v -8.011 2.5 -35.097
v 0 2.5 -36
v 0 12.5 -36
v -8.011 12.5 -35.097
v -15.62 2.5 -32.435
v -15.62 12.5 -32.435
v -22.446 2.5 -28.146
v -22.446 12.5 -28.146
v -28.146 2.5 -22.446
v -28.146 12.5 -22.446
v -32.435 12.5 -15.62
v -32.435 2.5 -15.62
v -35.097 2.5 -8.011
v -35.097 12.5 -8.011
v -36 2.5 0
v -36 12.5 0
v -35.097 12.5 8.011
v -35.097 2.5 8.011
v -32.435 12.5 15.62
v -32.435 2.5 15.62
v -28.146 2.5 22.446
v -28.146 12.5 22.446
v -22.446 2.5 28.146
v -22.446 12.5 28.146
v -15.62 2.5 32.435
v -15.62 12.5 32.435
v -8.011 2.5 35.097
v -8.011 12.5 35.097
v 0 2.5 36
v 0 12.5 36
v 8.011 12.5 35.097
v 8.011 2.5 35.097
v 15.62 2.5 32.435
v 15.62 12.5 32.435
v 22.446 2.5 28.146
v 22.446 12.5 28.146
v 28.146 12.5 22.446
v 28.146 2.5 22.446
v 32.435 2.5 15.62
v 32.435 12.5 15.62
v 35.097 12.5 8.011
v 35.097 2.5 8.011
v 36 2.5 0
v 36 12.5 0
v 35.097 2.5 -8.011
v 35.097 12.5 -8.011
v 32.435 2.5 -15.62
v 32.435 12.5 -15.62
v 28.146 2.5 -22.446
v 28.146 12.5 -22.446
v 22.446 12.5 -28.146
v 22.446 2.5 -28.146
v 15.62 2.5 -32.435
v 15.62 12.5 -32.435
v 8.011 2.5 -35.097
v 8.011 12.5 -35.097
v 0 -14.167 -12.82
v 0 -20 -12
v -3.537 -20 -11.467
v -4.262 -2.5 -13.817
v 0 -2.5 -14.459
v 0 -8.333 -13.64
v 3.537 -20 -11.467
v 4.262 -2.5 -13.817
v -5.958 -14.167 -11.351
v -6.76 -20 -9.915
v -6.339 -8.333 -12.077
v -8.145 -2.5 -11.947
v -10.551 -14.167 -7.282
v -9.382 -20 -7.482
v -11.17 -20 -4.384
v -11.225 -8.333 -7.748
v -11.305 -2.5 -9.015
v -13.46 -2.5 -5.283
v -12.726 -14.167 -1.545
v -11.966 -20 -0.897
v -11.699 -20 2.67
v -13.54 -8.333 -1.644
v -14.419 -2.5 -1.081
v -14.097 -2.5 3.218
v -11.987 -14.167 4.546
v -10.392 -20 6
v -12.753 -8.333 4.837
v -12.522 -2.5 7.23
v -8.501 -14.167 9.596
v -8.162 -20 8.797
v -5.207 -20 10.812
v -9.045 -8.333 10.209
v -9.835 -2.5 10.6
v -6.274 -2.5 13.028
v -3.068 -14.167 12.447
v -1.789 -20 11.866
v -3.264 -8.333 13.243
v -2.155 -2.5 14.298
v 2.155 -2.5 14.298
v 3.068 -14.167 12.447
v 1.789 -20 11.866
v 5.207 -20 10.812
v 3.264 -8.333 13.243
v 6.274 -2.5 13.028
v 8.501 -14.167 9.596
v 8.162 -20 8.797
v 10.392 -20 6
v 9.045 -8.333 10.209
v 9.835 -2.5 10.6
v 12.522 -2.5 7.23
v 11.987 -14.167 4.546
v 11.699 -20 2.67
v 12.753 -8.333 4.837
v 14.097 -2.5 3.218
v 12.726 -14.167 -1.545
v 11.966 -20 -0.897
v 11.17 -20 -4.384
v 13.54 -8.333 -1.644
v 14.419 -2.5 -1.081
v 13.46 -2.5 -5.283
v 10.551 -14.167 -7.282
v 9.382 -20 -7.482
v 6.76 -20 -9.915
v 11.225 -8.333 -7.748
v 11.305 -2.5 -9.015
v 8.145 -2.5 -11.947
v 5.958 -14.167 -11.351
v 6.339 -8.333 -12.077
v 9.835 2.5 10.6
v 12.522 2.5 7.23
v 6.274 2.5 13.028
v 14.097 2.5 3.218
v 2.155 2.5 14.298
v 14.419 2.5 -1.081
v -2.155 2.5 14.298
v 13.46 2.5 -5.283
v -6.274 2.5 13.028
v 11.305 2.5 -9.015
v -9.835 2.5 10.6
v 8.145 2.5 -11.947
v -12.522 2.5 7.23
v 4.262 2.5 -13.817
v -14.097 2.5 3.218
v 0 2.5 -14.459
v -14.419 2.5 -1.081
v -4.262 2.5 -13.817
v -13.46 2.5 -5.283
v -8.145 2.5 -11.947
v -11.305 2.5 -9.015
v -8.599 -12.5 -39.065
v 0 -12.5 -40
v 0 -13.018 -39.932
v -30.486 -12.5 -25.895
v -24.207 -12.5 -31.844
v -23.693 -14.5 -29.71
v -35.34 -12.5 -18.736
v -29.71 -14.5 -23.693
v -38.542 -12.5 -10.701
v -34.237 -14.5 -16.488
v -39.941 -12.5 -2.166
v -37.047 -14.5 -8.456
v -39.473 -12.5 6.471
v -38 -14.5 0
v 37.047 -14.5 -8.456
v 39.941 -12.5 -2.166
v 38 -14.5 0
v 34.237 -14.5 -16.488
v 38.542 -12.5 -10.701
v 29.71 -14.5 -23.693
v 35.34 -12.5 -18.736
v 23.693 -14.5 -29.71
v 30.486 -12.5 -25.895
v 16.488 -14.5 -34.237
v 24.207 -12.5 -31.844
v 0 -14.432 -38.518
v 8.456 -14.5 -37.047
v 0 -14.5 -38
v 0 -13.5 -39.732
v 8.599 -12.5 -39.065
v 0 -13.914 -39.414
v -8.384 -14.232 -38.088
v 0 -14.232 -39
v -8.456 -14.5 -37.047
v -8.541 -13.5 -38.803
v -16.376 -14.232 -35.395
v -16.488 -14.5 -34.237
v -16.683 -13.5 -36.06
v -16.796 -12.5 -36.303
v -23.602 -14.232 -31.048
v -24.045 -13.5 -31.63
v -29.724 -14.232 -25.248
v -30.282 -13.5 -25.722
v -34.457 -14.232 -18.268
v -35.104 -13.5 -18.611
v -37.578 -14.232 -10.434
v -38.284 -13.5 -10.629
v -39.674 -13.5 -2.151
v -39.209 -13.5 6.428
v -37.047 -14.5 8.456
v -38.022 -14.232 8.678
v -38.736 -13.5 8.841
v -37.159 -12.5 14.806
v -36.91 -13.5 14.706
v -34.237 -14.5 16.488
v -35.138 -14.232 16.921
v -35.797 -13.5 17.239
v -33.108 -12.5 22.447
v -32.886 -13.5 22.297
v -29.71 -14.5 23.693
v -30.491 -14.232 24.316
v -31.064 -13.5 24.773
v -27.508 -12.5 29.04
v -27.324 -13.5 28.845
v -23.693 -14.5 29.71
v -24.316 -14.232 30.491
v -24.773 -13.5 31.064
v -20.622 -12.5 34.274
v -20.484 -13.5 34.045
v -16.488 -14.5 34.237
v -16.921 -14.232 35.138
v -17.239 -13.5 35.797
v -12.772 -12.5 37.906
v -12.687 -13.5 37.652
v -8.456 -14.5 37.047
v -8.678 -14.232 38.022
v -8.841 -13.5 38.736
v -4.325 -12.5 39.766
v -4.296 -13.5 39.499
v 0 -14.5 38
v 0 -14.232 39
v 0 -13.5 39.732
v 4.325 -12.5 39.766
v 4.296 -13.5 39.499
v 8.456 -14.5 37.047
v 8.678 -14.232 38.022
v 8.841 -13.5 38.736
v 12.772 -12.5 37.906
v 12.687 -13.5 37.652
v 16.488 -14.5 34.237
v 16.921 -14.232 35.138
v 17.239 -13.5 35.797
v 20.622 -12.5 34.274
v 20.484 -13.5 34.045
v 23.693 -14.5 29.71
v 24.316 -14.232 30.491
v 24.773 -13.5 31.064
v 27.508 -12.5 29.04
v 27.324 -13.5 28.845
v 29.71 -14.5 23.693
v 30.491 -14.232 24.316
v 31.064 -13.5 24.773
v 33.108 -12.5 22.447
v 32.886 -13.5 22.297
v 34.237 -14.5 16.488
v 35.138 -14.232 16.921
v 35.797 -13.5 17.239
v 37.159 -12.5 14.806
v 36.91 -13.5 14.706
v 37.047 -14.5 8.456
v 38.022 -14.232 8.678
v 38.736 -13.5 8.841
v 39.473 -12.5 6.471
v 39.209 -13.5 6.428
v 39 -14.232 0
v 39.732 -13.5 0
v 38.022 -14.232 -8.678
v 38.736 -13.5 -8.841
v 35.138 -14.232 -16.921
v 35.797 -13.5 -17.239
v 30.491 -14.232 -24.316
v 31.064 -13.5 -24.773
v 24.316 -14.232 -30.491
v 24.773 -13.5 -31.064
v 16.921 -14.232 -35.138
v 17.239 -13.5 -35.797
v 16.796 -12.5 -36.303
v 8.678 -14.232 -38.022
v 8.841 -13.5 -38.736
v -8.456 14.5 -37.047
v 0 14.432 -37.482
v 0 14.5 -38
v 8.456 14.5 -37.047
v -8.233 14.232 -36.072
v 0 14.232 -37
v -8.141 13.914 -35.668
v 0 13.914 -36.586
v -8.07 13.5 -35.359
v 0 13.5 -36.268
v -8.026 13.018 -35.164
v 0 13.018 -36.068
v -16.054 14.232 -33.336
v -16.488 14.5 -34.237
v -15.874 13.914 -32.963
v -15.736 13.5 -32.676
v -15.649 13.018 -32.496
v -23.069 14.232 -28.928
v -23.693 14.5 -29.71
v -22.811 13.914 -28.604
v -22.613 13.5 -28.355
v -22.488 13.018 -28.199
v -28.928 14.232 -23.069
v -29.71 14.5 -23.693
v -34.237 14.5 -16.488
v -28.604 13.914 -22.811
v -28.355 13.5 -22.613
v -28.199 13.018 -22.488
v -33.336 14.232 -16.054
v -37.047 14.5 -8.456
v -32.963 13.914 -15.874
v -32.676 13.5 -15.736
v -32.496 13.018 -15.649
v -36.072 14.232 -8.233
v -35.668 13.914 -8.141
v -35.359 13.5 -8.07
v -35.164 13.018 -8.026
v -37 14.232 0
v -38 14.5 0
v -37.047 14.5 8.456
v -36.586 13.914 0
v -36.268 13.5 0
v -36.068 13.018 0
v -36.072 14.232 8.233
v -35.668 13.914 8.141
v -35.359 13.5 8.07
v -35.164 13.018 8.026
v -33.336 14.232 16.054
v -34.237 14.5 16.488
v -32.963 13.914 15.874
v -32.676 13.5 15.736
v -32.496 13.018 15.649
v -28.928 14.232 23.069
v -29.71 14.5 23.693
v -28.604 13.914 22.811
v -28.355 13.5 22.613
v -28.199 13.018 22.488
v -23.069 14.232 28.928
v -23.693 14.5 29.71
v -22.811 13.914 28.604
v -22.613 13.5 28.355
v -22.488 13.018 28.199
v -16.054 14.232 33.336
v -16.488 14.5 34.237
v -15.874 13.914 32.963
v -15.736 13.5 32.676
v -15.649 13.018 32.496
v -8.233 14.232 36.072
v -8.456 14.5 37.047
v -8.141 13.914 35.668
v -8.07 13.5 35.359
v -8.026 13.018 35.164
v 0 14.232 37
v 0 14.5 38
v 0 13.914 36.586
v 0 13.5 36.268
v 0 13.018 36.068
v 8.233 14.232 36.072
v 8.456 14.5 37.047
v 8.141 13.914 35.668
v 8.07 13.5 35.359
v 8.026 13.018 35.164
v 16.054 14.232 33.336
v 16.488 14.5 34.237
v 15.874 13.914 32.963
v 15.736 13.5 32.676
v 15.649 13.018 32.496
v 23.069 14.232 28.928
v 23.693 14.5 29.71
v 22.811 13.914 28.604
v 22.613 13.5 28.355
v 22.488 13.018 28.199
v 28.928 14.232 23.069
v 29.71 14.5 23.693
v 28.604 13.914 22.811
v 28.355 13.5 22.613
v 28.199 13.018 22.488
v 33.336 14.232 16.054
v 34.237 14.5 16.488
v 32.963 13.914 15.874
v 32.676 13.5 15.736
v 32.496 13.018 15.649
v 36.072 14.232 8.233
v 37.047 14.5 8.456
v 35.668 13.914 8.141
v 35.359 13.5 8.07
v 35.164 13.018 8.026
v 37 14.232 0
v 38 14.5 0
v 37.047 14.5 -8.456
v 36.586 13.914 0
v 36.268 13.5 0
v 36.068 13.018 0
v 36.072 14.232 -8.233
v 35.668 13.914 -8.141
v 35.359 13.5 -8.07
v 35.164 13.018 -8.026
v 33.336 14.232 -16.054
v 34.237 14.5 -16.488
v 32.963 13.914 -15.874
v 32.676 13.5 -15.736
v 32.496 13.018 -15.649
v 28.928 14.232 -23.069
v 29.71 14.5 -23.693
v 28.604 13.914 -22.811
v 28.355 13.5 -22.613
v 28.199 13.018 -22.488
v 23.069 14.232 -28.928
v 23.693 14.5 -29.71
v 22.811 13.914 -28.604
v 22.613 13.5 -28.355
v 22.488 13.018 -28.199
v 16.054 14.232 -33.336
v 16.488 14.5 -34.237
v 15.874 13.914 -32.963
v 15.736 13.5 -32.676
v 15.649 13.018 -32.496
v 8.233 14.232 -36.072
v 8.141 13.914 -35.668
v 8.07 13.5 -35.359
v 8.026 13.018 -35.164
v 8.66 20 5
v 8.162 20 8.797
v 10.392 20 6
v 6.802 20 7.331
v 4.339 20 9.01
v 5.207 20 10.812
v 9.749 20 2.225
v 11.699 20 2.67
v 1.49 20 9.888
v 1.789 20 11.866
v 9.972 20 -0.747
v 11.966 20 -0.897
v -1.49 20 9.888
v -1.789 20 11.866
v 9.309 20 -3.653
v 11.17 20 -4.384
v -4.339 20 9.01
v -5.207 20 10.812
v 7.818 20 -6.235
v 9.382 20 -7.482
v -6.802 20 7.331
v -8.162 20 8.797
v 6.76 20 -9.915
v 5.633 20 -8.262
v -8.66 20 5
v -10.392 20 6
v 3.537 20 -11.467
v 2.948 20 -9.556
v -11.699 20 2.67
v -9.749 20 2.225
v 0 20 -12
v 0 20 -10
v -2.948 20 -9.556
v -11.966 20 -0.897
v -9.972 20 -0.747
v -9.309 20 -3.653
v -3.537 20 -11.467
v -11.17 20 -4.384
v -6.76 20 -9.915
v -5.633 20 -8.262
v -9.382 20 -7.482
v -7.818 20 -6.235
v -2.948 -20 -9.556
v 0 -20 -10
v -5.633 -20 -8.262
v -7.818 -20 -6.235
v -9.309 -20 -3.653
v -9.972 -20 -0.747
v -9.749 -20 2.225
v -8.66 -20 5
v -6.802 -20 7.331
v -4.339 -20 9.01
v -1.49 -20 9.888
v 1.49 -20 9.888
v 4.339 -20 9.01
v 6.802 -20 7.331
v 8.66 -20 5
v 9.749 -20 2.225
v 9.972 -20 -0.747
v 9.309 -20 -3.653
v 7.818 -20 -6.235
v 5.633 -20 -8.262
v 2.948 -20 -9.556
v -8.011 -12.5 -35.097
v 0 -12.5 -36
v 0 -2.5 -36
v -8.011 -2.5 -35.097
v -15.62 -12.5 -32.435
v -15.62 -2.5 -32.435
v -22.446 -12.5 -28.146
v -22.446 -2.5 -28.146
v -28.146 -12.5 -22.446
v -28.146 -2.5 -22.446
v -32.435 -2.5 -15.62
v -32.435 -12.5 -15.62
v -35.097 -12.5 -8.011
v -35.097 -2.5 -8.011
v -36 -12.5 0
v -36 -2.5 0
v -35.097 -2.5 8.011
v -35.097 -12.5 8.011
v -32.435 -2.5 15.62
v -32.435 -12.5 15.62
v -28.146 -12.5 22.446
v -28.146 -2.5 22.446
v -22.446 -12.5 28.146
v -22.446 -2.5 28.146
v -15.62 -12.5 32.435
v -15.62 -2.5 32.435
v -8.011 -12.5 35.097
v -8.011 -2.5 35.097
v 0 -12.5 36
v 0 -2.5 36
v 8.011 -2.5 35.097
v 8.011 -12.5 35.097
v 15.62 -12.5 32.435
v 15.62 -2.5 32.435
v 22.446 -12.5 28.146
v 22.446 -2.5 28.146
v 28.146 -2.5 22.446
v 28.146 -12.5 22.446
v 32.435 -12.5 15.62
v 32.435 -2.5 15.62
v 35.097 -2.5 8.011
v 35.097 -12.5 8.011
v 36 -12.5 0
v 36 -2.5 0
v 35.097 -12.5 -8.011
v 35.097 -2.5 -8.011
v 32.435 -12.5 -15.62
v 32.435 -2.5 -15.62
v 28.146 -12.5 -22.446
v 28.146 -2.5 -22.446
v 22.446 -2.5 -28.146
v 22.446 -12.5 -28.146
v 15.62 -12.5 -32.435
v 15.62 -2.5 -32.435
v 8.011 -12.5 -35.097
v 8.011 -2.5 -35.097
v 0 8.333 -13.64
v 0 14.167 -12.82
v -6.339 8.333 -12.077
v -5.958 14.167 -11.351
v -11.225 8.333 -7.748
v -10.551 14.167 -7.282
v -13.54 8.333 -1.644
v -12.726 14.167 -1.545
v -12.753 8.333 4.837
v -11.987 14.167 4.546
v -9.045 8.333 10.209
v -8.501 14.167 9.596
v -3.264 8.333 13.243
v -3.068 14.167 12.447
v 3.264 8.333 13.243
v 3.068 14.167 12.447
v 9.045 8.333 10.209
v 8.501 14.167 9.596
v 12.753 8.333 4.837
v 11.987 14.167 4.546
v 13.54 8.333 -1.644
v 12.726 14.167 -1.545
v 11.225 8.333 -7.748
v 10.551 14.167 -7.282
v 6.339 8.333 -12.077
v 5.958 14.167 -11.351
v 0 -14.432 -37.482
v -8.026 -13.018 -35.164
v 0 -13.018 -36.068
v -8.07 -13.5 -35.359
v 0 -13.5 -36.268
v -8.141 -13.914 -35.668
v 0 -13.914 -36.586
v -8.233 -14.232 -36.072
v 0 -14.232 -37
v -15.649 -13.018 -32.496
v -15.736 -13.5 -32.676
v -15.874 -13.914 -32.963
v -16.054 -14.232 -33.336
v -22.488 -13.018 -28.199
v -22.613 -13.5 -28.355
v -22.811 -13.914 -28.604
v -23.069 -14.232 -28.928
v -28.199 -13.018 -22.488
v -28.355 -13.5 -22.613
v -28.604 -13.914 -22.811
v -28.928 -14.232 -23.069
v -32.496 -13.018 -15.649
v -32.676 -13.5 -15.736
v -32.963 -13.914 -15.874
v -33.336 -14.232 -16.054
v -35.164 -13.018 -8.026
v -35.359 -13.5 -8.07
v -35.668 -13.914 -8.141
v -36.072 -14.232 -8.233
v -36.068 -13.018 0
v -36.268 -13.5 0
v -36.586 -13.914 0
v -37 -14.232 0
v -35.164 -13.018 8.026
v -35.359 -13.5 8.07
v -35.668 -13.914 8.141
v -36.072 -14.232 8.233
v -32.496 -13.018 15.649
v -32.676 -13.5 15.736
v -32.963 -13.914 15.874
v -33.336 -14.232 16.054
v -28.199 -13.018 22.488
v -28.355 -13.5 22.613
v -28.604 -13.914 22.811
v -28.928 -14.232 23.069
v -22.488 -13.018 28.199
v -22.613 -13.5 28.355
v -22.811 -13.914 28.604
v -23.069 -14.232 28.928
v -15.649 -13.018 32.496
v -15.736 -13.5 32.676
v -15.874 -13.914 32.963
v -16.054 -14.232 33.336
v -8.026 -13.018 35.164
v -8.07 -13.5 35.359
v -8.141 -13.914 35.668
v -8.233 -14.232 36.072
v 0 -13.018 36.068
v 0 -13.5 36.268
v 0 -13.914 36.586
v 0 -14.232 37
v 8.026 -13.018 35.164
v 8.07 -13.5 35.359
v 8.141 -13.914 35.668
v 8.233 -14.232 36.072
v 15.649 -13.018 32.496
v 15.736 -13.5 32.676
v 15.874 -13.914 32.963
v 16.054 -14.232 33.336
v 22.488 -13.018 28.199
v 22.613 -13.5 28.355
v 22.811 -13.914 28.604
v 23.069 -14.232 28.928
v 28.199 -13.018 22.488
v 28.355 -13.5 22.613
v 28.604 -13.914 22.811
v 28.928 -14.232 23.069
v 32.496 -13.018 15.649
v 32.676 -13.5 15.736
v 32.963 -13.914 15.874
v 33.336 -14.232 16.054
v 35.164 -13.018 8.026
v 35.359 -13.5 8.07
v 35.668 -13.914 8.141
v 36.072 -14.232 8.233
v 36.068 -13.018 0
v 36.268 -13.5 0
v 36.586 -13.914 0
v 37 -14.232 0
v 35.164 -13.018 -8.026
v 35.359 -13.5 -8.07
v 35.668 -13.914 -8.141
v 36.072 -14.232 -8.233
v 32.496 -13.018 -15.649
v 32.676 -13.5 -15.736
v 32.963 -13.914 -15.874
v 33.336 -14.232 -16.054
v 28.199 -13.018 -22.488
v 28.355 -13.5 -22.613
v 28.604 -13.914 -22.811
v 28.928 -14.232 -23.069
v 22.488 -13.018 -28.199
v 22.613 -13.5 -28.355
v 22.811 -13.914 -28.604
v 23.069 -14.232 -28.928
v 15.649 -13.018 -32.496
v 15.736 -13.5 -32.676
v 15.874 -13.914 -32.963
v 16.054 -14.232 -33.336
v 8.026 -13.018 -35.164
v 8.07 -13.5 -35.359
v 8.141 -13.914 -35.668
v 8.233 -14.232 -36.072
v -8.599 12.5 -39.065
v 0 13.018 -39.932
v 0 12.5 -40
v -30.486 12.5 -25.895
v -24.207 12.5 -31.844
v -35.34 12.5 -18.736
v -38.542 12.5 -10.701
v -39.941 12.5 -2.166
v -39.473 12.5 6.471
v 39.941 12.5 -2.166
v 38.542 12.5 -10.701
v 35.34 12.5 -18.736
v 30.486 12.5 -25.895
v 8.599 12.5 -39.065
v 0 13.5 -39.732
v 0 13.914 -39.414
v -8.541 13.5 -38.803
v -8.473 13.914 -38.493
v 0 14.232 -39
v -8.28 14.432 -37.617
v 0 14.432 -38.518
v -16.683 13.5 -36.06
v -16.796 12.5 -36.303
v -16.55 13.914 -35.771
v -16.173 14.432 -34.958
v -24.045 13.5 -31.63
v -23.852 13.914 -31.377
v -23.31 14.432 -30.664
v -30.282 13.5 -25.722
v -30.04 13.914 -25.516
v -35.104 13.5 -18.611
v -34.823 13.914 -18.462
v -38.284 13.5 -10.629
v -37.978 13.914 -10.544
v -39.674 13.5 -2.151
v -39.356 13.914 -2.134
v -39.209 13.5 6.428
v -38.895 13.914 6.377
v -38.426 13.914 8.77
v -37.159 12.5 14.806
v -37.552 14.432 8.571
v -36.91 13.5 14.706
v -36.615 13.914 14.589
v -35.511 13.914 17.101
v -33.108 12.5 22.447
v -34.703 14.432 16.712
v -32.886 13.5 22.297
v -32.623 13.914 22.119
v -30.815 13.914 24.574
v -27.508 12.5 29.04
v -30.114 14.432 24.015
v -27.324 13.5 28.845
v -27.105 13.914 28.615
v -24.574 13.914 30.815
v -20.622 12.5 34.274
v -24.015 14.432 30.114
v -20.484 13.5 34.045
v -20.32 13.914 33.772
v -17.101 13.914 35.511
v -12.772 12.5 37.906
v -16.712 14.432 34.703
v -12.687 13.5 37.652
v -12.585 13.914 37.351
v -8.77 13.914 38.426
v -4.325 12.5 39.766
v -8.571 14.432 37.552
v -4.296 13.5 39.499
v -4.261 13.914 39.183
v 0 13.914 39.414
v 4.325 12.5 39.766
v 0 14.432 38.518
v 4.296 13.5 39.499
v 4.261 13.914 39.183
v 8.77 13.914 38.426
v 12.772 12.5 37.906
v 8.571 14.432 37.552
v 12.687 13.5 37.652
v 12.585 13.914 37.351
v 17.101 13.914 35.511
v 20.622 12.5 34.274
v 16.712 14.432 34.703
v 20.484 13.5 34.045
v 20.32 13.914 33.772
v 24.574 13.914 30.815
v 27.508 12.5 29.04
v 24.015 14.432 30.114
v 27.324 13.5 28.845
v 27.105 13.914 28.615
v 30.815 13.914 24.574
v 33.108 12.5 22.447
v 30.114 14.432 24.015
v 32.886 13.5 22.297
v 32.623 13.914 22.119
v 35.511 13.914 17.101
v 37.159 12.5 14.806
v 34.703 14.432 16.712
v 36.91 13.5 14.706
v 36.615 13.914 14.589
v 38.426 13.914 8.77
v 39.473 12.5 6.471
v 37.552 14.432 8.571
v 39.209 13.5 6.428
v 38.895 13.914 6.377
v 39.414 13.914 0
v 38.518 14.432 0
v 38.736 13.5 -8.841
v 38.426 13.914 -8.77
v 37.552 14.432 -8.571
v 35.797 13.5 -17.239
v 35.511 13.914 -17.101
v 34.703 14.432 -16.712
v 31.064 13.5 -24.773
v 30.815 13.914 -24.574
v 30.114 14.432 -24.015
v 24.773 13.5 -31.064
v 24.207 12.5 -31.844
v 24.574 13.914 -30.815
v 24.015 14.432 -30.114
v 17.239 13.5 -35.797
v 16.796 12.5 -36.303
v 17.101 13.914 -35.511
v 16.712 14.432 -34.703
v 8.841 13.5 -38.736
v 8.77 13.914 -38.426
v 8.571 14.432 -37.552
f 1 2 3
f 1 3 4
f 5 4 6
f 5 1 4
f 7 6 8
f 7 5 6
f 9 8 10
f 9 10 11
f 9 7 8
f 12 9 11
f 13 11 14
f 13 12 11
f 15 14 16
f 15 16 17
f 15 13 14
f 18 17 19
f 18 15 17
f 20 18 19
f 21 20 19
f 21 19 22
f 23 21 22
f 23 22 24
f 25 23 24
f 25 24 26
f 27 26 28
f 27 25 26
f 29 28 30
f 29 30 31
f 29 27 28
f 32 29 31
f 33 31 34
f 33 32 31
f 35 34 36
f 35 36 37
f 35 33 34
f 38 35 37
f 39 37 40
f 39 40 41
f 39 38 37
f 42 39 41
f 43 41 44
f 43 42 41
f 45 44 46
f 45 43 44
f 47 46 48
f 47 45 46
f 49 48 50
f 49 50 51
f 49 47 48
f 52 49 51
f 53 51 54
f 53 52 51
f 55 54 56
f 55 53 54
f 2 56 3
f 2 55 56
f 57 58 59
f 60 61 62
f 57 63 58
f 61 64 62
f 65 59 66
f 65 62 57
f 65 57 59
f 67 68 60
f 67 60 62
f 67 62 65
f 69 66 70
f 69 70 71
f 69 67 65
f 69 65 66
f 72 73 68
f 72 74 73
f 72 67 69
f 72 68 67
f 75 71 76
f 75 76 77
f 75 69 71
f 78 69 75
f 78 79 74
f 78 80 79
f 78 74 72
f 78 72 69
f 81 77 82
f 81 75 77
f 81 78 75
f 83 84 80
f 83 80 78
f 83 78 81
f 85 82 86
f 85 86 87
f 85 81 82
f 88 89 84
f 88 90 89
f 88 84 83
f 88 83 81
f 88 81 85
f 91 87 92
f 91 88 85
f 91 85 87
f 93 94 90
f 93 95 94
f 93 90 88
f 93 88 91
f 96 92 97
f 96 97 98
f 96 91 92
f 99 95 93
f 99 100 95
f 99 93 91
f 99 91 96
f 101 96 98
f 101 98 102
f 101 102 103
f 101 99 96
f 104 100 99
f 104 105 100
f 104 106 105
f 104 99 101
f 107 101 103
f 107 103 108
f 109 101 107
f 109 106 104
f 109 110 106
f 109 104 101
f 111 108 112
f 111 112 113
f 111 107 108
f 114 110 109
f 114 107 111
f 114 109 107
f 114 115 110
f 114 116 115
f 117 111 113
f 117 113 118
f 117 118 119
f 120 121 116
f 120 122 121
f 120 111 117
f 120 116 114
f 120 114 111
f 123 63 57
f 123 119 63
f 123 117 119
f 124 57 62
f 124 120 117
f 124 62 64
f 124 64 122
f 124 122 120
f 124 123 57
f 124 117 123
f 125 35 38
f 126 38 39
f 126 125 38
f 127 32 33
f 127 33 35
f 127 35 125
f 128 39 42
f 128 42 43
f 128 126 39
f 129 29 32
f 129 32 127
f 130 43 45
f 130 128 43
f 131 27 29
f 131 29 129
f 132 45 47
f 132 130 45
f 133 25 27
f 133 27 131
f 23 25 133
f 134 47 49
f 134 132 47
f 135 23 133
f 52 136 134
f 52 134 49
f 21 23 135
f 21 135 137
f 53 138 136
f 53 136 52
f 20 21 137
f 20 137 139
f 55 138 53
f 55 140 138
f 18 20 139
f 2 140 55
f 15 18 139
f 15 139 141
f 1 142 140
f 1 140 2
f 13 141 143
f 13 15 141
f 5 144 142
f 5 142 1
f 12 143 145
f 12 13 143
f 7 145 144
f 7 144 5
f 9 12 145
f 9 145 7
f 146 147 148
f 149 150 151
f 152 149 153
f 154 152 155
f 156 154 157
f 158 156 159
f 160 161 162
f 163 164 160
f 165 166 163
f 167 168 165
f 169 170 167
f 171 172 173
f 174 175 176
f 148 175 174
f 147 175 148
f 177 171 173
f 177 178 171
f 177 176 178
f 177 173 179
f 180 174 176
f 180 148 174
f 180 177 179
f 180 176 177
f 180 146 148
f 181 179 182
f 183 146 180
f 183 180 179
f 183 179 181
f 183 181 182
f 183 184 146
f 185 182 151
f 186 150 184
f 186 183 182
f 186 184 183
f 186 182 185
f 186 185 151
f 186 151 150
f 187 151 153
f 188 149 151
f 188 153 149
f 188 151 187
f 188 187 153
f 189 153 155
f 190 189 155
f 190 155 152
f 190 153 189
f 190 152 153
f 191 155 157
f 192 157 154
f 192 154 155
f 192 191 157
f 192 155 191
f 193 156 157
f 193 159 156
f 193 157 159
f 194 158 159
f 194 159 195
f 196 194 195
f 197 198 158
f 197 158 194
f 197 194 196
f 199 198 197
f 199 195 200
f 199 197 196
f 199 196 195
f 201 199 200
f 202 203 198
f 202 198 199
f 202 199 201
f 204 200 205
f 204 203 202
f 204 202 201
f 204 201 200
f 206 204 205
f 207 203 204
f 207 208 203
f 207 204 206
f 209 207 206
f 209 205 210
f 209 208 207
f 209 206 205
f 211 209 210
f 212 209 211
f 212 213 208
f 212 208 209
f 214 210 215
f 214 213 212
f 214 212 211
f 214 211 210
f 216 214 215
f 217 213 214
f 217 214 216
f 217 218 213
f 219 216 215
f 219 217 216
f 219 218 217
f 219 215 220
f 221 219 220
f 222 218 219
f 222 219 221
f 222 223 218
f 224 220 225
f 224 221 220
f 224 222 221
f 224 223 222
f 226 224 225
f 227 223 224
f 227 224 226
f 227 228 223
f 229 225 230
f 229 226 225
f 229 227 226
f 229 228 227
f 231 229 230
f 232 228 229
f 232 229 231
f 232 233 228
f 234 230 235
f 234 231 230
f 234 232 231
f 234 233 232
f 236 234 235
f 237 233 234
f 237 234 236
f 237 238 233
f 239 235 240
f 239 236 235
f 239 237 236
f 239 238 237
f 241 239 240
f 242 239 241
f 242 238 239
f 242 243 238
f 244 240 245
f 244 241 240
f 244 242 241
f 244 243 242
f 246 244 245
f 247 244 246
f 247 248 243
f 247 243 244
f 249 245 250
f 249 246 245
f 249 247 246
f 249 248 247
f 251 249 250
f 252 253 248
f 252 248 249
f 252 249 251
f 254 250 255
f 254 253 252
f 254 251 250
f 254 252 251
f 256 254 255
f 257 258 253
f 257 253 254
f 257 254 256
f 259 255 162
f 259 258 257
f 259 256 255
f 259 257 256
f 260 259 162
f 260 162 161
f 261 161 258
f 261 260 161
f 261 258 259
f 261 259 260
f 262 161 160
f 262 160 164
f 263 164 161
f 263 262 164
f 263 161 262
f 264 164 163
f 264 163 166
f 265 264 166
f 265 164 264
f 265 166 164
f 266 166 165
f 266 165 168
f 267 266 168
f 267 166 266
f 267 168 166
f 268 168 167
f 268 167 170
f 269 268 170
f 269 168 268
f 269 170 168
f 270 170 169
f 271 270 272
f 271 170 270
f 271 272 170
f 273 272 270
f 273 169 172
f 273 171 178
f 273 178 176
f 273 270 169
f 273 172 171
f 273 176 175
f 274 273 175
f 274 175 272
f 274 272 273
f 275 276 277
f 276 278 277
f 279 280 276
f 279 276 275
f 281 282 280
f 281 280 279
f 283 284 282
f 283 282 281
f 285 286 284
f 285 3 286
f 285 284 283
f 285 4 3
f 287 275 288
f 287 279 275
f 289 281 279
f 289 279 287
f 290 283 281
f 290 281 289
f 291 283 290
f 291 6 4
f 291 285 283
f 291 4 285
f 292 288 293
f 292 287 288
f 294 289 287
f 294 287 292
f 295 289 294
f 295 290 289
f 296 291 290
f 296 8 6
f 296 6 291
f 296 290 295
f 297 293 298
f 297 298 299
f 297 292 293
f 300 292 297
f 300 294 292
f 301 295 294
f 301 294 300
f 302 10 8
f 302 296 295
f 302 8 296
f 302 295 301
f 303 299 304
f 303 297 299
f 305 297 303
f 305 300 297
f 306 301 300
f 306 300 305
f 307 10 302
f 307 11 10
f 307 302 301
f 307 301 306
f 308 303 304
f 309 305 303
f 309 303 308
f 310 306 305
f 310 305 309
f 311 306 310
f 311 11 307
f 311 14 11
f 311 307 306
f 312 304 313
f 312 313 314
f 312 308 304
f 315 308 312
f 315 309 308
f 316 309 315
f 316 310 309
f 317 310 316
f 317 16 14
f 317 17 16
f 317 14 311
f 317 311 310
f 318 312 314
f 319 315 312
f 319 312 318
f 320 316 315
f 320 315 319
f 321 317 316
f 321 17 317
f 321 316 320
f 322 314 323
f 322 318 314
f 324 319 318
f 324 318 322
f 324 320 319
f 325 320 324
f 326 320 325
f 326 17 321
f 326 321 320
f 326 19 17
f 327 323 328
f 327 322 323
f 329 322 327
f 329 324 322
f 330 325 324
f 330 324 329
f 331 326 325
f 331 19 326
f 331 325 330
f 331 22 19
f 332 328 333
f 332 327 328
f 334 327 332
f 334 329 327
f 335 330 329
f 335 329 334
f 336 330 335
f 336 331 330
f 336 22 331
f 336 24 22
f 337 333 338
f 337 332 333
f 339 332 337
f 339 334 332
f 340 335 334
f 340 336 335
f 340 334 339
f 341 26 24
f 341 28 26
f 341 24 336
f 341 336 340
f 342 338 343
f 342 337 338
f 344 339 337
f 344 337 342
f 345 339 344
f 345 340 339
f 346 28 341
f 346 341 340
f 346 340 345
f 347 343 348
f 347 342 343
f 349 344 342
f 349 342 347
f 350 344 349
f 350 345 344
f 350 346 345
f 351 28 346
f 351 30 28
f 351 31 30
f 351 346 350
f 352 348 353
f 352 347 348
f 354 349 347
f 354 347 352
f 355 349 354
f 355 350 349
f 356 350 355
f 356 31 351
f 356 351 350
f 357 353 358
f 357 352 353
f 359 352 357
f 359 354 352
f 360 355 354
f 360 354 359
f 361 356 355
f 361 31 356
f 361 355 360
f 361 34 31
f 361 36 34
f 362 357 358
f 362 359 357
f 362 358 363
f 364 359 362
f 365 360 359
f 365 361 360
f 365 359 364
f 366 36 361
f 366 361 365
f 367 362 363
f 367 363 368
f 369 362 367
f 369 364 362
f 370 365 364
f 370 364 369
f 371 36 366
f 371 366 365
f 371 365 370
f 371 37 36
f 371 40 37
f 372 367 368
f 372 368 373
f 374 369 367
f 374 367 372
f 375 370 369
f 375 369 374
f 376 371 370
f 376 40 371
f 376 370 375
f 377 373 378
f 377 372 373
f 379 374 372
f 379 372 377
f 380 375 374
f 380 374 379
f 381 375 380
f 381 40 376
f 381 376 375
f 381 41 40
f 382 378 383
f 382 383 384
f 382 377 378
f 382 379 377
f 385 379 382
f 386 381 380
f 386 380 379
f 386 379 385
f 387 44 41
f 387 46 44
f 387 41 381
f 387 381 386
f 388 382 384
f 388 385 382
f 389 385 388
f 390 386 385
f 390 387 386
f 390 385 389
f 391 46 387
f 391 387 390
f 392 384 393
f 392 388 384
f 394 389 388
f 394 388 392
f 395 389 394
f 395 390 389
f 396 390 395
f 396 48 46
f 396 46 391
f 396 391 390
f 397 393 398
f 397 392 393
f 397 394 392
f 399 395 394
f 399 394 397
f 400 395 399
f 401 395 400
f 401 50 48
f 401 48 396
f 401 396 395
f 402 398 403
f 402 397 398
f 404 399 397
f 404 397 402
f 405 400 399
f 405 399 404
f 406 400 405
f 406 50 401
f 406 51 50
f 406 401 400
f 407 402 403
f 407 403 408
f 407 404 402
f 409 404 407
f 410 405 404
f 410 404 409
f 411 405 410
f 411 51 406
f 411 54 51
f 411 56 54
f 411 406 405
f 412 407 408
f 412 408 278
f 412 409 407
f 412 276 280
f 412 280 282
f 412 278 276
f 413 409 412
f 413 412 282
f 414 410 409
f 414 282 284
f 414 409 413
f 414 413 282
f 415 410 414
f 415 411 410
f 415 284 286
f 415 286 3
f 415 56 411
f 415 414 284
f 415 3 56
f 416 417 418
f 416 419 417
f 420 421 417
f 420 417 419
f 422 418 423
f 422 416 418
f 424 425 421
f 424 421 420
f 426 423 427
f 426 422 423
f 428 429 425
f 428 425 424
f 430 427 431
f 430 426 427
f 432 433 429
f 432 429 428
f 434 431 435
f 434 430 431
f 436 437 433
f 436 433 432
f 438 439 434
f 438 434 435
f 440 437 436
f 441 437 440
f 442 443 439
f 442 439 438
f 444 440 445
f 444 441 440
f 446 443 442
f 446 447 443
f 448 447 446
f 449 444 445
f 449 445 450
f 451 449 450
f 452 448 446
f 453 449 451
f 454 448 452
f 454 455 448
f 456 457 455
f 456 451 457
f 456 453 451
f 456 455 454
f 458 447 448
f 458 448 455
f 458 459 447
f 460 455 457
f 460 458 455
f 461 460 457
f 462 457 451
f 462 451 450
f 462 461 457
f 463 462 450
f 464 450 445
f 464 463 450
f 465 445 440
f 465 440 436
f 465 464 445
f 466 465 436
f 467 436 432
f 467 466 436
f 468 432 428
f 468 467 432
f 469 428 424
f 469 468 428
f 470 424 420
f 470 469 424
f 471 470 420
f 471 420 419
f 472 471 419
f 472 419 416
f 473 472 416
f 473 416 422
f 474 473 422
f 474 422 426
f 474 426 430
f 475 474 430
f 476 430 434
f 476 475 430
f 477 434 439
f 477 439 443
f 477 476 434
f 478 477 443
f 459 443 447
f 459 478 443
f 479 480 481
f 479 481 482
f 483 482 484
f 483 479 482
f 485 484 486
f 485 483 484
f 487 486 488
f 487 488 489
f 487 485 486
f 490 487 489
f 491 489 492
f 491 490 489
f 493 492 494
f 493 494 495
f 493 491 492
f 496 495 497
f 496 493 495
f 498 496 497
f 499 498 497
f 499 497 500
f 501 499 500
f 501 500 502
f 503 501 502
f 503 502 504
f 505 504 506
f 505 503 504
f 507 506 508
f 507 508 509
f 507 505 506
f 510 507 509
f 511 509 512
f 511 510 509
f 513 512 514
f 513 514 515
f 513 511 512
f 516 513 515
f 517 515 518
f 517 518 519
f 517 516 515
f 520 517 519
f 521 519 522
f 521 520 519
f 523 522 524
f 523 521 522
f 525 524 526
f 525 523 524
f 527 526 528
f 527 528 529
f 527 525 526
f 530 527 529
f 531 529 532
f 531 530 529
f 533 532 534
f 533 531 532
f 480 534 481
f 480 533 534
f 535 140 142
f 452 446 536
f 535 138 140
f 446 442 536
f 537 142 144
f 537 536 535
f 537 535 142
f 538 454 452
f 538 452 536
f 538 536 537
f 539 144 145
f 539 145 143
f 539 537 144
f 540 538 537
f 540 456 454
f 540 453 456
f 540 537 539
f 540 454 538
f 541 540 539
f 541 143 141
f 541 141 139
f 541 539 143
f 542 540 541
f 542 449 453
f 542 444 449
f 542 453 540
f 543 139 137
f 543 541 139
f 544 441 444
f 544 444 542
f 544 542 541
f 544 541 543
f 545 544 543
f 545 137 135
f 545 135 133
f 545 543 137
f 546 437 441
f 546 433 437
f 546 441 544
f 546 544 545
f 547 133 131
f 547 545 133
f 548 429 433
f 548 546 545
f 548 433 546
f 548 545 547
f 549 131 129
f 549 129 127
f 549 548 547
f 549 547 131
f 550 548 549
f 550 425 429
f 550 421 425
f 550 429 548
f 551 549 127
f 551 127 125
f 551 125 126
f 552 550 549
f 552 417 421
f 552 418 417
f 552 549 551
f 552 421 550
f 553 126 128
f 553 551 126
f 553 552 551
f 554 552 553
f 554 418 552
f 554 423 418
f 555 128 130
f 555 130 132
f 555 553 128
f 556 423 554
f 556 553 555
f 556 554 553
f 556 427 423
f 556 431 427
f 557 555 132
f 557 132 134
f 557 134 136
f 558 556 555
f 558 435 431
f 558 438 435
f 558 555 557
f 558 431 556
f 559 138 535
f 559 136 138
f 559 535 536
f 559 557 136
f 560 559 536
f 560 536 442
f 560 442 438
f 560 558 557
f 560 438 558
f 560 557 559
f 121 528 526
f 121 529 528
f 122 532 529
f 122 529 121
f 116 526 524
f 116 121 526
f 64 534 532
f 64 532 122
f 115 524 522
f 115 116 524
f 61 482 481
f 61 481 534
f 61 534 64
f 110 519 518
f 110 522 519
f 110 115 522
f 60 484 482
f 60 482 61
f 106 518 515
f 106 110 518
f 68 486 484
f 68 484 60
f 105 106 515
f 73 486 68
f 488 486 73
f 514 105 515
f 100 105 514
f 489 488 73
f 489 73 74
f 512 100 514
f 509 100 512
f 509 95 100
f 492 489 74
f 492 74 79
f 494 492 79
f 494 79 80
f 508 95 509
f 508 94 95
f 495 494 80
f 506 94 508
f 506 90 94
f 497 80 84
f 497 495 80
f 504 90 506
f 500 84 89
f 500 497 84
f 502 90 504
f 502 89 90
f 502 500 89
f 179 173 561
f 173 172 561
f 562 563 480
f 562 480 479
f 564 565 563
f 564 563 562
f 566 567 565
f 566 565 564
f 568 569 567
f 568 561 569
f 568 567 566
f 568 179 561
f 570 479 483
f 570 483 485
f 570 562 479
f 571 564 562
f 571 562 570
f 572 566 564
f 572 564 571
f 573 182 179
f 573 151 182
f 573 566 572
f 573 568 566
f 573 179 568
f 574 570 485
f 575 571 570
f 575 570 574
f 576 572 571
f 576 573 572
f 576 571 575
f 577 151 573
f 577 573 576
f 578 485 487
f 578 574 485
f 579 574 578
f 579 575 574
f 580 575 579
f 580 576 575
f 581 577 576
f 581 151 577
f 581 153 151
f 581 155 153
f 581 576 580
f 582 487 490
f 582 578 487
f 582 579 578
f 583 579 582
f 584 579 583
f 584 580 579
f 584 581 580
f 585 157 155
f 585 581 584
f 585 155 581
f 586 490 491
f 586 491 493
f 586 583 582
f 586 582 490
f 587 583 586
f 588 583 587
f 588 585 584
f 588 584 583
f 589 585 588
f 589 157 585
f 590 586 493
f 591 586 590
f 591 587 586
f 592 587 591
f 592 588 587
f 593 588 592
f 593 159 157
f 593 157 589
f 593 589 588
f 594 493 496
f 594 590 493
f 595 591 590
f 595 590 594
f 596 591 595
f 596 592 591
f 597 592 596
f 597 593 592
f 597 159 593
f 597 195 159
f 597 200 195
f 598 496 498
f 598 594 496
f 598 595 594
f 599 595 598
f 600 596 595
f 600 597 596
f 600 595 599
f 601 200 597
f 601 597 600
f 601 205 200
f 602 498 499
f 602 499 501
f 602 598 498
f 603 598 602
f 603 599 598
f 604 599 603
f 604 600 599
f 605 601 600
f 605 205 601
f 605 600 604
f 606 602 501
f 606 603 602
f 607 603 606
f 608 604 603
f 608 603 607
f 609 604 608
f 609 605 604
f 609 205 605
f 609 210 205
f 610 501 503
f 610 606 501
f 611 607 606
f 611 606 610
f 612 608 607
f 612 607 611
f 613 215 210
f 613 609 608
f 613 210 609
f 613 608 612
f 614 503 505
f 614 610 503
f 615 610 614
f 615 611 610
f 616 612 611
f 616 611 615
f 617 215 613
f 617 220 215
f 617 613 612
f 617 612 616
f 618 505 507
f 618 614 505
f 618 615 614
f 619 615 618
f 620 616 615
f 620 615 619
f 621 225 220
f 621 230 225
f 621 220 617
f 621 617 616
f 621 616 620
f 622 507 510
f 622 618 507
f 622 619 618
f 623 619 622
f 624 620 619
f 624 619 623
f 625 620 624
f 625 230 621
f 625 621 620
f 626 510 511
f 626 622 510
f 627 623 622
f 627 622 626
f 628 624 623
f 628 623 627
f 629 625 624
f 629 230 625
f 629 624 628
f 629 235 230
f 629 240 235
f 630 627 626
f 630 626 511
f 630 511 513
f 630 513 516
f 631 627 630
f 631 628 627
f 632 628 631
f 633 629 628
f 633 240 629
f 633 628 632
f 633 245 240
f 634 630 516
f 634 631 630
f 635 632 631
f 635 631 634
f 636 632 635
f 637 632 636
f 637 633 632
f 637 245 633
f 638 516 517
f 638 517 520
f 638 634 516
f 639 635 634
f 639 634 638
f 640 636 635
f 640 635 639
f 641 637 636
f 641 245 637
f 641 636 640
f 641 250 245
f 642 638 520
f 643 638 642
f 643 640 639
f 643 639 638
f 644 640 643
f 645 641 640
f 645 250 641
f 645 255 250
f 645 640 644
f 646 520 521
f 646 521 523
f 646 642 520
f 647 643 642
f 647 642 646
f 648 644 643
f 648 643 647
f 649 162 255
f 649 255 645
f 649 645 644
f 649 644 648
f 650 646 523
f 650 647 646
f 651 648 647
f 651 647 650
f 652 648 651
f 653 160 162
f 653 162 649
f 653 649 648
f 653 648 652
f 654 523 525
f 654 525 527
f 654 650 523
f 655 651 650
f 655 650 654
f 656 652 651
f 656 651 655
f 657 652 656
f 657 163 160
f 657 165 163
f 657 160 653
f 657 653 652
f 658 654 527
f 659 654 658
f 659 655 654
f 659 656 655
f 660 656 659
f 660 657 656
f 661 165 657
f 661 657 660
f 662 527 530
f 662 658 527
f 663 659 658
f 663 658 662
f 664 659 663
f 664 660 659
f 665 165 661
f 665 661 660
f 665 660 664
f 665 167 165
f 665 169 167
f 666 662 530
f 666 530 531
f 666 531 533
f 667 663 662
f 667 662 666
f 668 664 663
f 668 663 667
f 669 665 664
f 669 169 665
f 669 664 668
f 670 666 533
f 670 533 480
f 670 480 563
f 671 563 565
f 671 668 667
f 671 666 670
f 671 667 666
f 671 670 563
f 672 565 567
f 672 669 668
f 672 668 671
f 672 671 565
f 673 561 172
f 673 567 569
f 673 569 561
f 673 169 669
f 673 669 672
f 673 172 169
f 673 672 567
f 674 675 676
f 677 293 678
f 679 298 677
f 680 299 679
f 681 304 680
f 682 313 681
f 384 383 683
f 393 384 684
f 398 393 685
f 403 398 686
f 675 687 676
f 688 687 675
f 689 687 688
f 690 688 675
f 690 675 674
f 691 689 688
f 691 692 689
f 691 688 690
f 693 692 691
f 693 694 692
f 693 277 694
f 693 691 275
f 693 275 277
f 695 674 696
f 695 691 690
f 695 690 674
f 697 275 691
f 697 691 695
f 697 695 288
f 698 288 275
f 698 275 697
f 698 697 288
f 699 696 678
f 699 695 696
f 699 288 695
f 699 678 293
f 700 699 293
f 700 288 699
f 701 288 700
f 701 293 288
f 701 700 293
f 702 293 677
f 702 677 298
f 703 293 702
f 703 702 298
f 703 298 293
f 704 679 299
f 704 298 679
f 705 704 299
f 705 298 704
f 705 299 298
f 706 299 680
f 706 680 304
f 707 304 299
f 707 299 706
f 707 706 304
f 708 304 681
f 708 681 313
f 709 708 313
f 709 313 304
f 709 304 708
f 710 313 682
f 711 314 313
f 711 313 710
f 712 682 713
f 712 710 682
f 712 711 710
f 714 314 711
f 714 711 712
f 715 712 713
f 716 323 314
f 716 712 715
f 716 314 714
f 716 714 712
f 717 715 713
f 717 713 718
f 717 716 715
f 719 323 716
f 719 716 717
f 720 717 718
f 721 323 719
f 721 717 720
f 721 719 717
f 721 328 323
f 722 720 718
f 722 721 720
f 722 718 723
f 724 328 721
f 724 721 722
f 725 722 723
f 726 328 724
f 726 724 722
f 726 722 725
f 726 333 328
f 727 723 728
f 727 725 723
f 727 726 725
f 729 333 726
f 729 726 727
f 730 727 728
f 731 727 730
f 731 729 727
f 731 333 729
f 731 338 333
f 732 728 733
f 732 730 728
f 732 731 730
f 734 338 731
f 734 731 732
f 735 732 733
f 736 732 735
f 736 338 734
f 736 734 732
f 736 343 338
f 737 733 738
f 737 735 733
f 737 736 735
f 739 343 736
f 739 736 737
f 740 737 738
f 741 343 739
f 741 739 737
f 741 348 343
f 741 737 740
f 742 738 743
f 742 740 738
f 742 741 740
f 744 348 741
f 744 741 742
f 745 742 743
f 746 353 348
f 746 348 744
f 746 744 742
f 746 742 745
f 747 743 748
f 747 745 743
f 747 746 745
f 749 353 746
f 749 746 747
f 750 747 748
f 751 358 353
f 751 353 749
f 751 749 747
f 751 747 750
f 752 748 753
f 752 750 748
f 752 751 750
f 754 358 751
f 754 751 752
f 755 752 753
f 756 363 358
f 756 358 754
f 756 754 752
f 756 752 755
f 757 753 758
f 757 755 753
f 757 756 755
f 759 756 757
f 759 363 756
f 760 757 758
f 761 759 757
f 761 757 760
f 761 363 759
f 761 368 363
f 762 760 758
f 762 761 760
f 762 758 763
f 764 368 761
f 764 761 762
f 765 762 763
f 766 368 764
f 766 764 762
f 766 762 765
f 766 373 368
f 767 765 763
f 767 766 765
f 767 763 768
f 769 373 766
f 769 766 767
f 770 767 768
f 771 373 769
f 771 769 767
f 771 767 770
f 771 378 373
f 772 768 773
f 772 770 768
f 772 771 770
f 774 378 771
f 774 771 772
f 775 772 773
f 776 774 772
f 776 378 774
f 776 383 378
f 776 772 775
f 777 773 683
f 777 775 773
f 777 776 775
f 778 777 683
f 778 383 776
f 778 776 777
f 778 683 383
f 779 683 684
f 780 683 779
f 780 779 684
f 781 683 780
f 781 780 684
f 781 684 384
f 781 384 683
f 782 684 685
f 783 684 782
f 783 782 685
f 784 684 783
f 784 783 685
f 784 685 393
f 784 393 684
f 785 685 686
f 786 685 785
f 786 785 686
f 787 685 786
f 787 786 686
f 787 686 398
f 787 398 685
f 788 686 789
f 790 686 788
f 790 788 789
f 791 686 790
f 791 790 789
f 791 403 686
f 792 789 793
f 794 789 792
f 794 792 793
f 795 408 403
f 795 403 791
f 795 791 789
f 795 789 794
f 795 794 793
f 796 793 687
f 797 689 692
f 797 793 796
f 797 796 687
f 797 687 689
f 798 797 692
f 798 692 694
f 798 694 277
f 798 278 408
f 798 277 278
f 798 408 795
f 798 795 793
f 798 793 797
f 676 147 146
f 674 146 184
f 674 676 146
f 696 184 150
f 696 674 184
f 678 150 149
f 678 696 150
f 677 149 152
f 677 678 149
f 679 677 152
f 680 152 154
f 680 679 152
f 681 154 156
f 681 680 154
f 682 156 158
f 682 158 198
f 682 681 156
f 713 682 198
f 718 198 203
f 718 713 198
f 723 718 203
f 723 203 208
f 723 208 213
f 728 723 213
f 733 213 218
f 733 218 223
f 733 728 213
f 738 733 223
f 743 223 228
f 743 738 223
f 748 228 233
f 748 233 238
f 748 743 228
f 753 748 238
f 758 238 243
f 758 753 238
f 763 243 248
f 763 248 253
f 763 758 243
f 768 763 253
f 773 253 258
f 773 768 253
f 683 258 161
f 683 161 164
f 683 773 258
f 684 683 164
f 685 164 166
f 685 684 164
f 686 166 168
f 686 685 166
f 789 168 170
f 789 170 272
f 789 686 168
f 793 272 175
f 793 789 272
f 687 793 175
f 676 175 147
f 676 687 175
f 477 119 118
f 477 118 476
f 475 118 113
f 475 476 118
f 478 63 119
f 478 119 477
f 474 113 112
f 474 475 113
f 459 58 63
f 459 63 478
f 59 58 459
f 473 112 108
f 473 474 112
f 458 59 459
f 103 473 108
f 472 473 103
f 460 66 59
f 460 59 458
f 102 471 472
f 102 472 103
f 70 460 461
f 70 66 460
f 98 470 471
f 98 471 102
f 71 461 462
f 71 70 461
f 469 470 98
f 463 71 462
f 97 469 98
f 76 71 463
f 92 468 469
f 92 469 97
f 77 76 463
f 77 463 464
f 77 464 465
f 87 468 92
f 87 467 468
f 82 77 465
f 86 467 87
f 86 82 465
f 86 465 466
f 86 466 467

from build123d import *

# Parameters (mm, degrees)
FILLET2_R = 2


with BuildPart() as part:
    # Sketch1 → Revolve1 (revolve)
    with BuildSketch(Plane.XY, mode=Mode.PRIVATE) as revolve1_sk:
        Polygon((10, -20), (12, -20), (14.459464607, -2.5), (36, -2.5), (36, -14.5), (40, -14.5), (40, 14.5), (36, 14.5), (36, 2.5), (14.459464607, 2.5), (12, 20), (10, 20), align=None)
    revolve(revolve1_sk.sketch.rotate(Axis((0, -24.578986378, 0), (0, 1, 0)), 90), axis=Axis((0, -24.578986378, 0), (0, 1, 0)))

    # Fillet2
    fillet2_edges = [part.edges().sort_by_distance(p)[0] for p in [
        (0, 14.5, 36),
        (0, 14.5, 40),
        (0, -14.5, 40),
        (0, -14.5, 36),
    ]]
    fillet(fillet2_edges, radius=FILLET2_R - 0.0001)  # a hair under: the kernel refuses the full size


solid = part.part
